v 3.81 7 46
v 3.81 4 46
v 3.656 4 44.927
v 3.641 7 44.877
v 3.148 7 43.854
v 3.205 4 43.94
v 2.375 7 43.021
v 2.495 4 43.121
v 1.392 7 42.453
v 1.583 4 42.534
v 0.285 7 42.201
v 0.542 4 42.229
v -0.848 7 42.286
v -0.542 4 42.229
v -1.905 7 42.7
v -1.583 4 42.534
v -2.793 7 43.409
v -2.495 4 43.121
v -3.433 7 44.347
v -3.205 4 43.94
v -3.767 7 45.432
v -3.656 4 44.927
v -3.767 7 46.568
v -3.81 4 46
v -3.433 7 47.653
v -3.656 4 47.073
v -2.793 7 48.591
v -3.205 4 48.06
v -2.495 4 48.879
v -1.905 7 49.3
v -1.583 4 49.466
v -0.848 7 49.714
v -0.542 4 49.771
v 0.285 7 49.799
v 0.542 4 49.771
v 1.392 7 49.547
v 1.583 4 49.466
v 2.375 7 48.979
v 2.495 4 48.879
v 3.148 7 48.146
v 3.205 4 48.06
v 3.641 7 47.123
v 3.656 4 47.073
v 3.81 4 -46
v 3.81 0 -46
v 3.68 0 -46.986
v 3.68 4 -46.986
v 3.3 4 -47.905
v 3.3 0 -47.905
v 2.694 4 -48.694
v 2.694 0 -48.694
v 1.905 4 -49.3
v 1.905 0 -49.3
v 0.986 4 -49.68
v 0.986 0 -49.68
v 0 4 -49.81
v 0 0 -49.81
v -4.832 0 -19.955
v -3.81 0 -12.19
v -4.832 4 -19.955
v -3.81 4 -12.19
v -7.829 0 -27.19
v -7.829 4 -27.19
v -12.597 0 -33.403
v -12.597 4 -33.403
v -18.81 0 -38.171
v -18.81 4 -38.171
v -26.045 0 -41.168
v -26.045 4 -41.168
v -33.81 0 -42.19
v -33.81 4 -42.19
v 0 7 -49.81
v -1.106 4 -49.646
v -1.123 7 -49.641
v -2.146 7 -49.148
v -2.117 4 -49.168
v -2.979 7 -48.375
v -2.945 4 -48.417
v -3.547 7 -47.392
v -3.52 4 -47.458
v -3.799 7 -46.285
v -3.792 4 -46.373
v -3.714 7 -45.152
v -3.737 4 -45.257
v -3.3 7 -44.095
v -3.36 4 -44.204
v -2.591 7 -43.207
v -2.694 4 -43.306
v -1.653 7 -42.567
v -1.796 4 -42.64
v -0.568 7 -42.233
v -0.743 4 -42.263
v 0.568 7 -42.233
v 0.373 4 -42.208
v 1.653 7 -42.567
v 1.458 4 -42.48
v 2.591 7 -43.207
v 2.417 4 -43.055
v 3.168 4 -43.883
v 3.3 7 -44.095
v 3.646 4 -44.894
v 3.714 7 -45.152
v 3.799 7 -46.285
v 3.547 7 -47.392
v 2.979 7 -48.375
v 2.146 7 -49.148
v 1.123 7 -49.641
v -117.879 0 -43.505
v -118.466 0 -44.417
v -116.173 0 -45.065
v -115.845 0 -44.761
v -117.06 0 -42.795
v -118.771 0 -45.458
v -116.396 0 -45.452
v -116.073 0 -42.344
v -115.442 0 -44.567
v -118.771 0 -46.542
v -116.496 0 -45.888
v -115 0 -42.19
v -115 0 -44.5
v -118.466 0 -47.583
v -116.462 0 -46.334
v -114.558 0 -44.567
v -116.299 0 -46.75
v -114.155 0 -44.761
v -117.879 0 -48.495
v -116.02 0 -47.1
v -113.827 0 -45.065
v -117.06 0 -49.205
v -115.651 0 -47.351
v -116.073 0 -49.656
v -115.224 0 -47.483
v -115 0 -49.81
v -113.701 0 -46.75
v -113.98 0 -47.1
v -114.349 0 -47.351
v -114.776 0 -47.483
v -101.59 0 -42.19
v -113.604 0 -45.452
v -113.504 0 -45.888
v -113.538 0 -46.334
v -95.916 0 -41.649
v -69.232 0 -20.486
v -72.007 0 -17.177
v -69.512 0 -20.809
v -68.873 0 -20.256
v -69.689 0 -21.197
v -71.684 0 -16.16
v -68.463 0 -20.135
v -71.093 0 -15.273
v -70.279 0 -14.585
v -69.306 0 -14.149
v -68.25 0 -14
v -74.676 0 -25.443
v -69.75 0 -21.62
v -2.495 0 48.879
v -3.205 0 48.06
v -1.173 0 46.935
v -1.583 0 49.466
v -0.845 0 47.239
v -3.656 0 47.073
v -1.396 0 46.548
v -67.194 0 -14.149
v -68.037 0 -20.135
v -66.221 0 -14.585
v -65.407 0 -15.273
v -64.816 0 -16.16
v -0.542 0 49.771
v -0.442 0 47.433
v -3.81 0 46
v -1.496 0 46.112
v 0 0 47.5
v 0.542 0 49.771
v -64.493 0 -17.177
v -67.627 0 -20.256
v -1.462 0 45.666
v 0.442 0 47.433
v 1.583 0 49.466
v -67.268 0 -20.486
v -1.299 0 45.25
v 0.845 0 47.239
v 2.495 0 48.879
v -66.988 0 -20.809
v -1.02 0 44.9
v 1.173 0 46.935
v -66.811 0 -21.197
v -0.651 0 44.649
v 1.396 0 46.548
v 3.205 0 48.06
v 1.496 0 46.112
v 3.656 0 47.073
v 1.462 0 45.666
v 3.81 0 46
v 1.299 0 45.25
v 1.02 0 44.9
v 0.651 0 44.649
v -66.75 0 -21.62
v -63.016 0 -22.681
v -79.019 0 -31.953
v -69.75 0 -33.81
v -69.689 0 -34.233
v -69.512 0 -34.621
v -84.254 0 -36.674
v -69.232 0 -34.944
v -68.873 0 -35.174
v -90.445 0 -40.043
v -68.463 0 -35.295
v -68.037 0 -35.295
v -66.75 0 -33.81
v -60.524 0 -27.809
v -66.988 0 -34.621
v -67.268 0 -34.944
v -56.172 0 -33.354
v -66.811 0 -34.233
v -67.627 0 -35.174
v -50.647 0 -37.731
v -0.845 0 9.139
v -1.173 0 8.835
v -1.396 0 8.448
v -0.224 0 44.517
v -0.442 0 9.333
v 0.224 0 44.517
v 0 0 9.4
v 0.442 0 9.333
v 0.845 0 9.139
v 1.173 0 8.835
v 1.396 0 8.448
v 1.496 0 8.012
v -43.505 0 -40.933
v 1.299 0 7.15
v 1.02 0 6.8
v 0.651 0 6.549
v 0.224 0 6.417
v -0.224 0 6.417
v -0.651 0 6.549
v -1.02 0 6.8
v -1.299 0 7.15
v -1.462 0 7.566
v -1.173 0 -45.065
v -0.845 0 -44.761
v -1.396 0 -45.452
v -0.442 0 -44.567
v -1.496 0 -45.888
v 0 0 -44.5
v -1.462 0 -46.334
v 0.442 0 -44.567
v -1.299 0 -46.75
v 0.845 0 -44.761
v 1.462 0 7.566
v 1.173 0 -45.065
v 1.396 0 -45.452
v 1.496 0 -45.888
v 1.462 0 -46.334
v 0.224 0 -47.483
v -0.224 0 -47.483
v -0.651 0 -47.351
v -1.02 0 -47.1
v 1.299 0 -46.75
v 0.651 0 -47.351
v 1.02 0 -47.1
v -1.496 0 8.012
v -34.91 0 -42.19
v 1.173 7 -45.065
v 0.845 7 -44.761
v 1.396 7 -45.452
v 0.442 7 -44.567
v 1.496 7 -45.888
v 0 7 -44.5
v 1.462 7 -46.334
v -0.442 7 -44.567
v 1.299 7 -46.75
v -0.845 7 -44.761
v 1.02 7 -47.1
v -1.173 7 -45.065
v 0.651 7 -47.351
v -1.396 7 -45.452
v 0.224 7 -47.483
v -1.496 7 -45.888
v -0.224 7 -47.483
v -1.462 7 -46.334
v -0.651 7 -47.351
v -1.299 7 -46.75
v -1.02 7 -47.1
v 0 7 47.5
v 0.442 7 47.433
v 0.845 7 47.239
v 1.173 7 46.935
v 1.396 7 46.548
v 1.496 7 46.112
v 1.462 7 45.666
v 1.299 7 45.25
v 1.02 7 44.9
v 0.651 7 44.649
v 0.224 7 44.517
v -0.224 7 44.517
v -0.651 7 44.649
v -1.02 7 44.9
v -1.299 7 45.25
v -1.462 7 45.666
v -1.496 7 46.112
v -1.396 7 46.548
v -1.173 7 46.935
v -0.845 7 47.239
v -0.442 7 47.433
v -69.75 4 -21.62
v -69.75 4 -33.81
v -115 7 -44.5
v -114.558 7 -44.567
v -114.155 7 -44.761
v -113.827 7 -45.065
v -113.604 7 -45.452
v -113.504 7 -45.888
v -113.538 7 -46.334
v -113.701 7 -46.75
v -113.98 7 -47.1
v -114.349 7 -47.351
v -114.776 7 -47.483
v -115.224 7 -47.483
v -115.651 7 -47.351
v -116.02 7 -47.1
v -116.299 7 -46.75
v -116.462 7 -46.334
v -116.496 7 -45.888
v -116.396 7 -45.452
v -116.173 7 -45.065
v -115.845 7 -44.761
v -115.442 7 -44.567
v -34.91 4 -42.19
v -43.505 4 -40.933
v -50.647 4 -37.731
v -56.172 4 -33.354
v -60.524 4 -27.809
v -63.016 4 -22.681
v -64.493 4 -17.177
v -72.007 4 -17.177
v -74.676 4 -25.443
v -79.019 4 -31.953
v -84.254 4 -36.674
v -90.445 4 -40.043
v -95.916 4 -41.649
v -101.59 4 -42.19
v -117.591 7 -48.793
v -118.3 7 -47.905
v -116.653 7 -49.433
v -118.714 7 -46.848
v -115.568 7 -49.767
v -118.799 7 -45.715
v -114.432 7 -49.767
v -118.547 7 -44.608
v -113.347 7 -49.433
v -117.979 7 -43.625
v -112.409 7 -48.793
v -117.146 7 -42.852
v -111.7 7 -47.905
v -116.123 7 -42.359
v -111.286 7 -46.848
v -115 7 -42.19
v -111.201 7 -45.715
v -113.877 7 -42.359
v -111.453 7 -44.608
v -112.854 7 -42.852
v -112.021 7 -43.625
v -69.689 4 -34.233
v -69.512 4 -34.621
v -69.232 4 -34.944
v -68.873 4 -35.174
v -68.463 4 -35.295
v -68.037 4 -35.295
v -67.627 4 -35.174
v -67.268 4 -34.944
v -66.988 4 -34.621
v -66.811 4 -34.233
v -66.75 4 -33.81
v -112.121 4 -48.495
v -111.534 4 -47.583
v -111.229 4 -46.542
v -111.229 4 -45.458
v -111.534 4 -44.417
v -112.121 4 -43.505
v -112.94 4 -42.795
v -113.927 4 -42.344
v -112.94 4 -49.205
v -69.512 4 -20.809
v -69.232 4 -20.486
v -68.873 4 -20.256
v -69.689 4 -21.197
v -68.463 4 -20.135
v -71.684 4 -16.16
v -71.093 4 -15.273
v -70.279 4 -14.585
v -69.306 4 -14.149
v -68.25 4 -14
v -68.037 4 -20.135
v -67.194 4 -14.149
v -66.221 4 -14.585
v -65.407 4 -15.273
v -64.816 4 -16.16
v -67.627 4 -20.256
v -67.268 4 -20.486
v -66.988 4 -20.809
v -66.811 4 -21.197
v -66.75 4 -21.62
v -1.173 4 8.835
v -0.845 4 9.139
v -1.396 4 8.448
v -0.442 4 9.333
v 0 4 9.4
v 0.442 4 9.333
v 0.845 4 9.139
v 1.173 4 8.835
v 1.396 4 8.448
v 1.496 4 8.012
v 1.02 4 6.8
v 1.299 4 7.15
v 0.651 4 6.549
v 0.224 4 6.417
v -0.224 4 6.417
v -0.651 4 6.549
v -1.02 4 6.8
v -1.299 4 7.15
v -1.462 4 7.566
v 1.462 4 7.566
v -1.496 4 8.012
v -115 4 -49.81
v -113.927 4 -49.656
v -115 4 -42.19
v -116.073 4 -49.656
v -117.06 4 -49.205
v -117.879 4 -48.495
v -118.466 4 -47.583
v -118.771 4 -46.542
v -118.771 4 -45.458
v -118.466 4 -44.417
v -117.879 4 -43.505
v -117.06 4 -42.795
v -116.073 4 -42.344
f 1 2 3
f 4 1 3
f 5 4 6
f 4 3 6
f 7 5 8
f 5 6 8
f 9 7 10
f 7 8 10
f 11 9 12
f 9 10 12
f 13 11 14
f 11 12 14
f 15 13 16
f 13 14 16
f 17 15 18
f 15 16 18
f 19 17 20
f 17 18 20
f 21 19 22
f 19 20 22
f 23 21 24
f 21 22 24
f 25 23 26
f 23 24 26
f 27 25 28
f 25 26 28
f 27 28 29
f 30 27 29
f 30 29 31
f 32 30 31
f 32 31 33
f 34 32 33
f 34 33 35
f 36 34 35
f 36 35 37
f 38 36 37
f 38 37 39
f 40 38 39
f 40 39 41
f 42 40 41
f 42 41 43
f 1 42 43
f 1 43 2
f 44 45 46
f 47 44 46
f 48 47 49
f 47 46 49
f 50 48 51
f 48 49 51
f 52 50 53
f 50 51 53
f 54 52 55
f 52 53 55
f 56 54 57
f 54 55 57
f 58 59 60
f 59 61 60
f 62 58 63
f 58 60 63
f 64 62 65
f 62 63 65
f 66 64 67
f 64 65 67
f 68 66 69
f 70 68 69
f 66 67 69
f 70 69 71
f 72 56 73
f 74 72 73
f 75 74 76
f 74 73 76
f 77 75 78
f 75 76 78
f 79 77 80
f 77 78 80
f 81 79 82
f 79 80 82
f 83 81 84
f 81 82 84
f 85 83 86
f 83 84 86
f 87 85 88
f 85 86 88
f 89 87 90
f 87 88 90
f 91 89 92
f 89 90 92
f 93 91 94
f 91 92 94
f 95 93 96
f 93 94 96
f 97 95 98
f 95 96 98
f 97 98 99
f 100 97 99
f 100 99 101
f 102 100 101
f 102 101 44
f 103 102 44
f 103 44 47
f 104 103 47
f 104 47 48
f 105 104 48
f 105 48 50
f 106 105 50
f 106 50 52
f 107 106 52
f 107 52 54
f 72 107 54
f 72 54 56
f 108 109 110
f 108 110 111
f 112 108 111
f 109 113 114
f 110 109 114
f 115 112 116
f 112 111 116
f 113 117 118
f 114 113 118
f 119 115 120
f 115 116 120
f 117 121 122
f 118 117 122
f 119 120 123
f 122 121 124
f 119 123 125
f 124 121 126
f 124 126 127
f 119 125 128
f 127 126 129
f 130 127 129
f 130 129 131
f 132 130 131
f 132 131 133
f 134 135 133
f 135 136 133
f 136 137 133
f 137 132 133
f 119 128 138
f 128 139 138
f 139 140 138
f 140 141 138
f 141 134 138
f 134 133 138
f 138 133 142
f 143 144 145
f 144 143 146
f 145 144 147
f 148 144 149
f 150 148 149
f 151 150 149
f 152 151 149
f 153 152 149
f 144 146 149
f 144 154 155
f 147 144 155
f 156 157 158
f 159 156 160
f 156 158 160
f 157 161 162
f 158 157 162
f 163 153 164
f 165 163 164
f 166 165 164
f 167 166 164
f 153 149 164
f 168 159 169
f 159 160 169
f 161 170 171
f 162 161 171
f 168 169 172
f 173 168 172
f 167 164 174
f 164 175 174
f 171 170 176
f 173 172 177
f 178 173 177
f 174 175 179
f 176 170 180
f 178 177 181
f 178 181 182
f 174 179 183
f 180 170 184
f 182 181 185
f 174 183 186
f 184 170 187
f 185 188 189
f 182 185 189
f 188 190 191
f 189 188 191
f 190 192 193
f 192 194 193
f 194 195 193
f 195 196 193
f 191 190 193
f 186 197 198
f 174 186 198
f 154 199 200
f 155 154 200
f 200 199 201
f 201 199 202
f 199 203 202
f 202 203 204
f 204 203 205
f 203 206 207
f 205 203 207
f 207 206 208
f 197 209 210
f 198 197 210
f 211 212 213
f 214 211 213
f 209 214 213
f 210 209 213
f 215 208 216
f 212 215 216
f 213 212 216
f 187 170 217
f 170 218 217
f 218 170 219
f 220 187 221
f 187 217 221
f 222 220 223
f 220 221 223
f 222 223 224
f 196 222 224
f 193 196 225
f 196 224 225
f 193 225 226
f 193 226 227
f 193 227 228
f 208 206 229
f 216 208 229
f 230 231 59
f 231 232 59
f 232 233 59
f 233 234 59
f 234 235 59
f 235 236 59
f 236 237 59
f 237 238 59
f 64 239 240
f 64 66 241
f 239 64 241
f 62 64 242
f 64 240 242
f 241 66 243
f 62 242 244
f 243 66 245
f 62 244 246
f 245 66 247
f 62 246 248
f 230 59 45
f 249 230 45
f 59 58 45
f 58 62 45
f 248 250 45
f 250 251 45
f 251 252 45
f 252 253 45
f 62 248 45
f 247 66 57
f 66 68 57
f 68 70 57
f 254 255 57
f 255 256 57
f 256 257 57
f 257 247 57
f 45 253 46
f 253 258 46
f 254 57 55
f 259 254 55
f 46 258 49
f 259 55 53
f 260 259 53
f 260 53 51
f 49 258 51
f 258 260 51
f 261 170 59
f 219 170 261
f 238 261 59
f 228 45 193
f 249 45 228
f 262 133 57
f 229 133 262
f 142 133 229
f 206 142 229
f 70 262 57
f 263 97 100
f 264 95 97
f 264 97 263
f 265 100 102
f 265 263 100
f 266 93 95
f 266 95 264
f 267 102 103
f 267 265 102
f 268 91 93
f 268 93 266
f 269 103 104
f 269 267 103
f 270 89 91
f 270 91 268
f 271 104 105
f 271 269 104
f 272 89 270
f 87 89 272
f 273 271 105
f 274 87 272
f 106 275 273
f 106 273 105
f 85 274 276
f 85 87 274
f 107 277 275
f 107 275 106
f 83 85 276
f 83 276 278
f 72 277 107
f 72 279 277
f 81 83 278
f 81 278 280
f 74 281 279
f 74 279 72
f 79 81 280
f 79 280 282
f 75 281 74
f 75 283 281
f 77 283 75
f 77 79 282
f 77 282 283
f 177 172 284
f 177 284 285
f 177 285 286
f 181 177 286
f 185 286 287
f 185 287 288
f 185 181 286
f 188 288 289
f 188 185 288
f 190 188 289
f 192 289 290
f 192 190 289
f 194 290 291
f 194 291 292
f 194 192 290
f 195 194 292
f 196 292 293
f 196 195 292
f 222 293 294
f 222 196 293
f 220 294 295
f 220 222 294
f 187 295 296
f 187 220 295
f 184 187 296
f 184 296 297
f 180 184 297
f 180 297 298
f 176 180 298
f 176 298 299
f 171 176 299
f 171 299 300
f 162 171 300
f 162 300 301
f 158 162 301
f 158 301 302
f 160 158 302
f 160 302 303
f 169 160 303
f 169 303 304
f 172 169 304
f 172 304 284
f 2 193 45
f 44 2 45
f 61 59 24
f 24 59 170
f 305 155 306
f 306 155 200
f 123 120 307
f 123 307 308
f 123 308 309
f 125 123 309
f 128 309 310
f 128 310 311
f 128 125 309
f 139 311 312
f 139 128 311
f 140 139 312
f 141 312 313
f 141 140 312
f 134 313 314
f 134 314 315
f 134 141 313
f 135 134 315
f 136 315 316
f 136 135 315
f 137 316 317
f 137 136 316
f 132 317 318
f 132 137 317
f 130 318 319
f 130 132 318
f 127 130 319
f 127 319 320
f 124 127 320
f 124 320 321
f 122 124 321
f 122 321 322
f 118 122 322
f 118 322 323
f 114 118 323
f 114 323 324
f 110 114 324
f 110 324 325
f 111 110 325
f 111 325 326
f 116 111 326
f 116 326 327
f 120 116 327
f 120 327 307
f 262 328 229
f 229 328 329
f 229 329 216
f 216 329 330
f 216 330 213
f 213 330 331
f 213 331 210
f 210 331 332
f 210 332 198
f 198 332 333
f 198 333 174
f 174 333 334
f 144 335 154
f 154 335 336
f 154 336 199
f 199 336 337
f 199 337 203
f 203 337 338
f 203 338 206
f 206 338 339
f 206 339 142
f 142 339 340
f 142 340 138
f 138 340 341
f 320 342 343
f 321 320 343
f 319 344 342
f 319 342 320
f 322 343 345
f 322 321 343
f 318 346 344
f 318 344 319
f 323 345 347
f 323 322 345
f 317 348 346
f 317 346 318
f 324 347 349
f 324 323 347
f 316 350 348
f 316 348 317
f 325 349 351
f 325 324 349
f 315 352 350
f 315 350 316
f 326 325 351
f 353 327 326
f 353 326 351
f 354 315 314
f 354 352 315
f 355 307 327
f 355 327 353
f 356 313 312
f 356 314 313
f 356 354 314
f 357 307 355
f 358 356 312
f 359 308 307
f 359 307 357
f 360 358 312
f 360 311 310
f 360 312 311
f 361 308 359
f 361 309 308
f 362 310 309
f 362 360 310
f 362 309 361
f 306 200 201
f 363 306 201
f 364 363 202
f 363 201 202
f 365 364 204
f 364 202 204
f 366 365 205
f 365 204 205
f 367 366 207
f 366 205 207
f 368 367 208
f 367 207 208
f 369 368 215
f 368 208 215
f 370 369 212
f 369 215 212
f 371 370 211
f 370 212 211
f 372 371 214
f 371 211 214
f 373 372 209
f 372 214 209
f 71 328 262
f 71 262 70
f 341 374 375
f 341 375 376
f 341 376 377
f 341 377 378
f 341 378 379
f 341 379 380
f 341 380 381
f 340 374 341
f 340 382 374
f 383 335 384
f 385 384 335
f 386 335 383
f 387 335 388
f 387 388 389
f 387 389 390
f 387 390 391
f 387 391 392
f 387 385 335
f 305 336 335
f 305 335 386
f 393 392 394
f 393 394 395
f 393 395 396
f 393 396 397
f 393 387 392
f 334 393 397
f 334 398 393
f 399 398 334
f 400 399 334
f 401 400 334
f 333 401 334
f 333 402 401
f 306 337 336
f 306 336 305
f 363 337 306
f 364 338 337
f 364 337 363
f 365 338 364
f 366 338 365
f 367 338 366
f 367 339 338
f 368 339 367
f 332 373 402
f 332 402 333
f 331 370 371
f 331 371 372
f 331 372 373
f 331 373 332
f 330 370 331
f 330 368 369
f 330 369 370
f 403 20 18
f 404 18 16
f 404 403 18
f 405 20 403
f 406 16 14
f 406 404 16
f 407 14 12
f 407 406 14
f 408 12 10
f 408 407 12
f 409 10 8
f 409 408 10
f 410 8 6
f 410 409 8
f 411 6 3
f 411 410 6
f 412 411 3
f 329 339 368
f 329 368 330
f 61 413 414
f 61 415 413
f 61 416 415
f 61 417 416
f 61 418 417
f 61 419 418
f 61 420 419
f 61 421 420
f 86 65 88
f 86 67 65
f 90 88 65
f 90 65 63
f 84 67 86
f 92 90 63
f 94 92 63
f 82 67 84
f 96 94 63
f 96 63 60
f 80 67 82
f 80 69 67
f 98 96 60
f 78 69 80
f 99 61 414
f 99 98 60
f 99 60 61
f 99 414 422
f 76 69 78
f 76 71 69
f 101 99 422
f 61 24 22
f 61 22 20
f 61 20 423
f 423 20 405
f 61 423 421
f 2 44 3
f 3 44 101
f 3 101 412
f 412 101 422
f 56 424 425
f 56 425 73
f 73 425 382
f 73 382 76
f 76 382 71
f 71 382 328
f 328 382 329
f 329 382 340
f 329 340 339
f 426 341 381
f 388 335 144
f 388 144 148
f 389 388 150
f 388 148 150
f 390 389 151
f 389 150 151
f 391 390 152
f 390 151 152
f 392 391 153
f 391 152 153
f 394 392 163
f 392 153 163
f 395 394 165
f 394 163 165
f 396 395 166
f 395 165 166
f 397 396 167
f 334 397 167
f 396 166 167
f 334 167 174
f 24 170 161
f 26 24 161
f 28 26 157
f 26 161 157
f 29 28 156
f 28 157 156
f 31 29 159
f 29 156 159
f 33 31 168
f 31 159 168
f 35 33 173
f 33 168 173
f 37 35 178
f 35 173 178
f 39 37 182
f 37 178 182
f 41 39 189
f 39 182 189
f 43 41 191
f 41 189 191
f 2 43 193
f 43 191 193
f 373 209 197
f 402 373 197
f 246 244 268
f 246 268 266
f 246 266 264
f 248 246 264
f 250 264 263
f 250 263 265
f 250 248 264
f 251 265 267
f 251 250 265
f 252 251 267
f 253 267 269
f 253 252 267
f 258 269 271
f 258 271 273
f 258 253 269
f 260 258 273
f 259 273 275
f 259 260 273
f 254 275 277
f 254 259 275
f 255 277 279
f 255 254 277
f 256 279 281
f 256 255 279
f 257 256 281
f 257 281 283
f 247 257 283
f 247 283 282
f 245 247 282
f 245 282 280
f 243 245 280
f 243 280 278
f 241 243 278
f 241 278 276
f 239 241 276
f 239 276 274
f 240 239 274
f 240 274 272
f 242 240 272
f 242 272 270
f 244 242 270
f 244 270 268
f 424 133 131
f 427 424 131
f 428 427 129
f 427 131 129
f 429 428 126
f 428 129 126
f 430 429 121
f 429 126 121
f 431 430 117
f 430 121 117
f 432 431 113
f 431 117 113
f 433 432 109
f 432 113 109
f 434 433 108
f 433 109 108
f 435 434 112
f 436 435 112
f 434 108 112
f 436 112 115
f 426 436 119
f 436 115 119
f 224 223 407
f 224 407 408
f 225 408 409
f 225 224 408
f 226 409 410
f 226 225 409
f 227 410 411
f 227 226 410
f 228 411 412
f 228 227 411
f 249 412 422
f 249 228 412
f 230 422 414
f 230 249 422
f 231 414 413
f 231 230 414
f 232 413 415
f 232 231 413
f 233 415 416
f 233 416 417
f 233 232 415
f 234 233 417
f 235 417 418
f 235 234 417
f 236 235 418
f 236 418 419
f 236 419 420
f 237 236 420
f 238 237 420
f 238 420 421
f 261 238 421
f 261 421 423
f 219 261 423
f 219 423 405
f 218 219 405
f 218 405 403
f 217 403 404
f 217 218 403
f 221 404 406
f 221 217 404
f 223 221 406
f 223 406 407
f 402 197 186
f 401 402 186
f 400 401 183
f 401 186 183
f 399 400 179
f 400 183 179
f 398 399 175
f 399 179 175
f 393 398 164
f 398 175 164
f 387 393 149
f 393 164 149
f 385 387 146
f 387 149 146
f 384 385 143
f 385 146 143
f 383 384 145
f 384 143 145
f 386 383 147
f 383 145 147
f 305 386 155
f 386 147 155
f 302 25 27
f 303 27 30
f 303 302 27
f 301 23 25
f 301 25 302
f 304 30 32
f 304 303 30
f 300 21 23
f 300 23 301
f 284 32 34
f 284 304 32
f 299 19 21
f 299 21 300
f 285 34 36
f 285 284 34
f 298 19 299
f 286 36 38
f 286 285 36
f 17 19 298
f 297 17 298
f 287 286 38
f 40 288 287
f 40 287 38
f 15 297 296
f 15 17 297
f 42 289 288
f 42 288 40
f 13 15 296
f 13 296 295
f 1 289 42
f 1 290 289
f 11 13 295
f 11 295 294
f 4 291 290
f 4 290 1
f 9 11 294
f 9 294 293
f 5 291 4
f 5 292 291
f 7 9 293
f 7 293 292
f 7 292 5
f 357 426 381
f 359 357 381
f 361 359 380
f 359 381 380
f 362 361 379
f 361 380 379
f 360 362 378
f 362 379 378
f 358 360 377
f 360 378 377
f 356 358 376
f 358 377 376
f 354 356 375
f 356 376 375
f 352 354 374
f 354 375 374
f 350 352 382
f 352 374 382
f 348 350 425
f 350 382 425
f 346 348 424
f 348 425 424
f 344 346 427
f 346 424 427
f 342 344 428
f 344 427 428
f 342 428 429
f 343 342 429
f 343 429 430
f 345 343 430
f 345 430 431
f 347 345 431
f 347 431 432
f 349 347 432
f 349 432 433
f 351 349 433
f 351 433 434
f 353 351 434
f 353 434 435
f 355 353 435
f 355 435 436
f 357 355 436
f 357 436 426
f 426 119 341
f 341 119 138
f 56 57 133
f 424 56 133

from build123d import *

# Parameters (mm, degrees)
SKETCH1_R           = 1.5
BOSS_EXTRUDE1_DEPTH = 4
SKETCH1_3_R         = 3.81
SKETCH1_3_R_2       = 1.5
BOSS_EXTRUDE2_DEPTH = 7
FILLET1_R           = 30


with BuildPart() as part:
    # Sketch1 → Boss-Extrude1 (new body)
    with BuildSketch(Plane(origin=(0, 0, 0), x_dir=(1, 0, 0), z_dir=(0, 1, 0))):
        with BuildLine():
            ThreePointArc((-3.81, -46), (0, -49.81), (3.81, -46))
            Line((3.81, -46), (3.81, 46))
            ThreePointArc((3.81, 46), (2.694076836, 48.694076836), (0, 49.81))
            Line((0, 49.81), (-115.000000027, 49.81))
            ThreePointArc((-115.000000027, 49.81), (-118.81, 45.999999987), (-115, 42.19))
            Line((-115, 42.19), (-72.06, 42.19))
            Line((-72.06, 42.19), (-72.06, 17.81))
            ThreePointArc((-72.06, 17.81), (-68.25, 14), (-64.44, 17.81))
            Line((-64.44, 17.81), (-64.44, 42.19))
            Line((-64.44, 42.19), (-3.81, 42.19))
            Line((-3.81, 42.19), (-3.81, -46))
        make_face()
        with Locations((0, -46)):
            Circle(SKETCH1_R, mode=Mode.SUBTRACT)
        with Locations((0, -7.9)):
            Circle(SKETCH1_R, mode=Mode.SUBTRACT)
        with Locations((0, 46)):
            Circle(SKETCH1_R, mode=Mode.SUBTRACT)
        with BuildLine():
            Line((-66.75, 33.81), (-66.75, 21.62))
            ThreePointArc((-66.75, 21.62), (-68.25, 20.12), (-69.75, 21.62))
            Line((-69.75, 21.62), (-69.75, 33.81))
            ThreePointArc((-69.75, 33.81), (-68.25, 35.31), (-66.75, 33.81))
        make_face(mode=Mode.SUBTRACT)
        with Locations((-115, 46)):
            Circle(SKETCH1_R, mode=Mode.SUBTRACT)
    extrude(amount=BOSS_EXTRUDE1_DEPTH)

    # Sketch1<3> → Boss-Extrude2 (add)
    # profile 1 of 3: a face of its own
    with BuildSketch(Plane(origin=(0, 0, 0), x_dir=(1, 0, 0), z_dir=(0, 1, 0))):
        with Locations((0, -46)):
            Circle(SKETCH1_3_R)
        with Locations((0, -46)):
            Circle(SKETCH1_3_R_2, mode=Mode.SUBTRACT)
    # profile 2 of 3: a face of its own
    with BuildSketch(Plane(origin=(0, 0, 0), x_dir=(1, 0, 0), z_dir=(0, 1, 0))):
        with Locations((0, 46)):
            Circle(SKETCH1_3_R)
        with Locations((0, 46)):
            Circle(SKETCH1_3_R_2, mode=Mode.SUBTRACT)
    # profile 3 of 3: a face of its own
    with BuildSketch(Plane(origin=(0, 0, 0), x_dir=(1, 0, 0), z_dir=(0, 1, 0))):
        with Locations((-115, 46)):
            Circle(SKETCH1_3_R)
        with Locations((-115, 46)):
            Circle(SKETCH1_3_R_2, mode=Mode.SUBTRACT)
    extrude(amount=BOSS_EXTRUDE2_DEPTH)

    # Fillet1
    fillet1_edges = [part.edges().sort_by_distance(p)[0] for p in [
        (-64.44, 2, -42.19),
        (-72.06, 2, -42.19),
        (-3.81, 2, -42.19),
    ]]
    fillet(fillet1_edges, radius=FILLET1_R)


solid = part.part
